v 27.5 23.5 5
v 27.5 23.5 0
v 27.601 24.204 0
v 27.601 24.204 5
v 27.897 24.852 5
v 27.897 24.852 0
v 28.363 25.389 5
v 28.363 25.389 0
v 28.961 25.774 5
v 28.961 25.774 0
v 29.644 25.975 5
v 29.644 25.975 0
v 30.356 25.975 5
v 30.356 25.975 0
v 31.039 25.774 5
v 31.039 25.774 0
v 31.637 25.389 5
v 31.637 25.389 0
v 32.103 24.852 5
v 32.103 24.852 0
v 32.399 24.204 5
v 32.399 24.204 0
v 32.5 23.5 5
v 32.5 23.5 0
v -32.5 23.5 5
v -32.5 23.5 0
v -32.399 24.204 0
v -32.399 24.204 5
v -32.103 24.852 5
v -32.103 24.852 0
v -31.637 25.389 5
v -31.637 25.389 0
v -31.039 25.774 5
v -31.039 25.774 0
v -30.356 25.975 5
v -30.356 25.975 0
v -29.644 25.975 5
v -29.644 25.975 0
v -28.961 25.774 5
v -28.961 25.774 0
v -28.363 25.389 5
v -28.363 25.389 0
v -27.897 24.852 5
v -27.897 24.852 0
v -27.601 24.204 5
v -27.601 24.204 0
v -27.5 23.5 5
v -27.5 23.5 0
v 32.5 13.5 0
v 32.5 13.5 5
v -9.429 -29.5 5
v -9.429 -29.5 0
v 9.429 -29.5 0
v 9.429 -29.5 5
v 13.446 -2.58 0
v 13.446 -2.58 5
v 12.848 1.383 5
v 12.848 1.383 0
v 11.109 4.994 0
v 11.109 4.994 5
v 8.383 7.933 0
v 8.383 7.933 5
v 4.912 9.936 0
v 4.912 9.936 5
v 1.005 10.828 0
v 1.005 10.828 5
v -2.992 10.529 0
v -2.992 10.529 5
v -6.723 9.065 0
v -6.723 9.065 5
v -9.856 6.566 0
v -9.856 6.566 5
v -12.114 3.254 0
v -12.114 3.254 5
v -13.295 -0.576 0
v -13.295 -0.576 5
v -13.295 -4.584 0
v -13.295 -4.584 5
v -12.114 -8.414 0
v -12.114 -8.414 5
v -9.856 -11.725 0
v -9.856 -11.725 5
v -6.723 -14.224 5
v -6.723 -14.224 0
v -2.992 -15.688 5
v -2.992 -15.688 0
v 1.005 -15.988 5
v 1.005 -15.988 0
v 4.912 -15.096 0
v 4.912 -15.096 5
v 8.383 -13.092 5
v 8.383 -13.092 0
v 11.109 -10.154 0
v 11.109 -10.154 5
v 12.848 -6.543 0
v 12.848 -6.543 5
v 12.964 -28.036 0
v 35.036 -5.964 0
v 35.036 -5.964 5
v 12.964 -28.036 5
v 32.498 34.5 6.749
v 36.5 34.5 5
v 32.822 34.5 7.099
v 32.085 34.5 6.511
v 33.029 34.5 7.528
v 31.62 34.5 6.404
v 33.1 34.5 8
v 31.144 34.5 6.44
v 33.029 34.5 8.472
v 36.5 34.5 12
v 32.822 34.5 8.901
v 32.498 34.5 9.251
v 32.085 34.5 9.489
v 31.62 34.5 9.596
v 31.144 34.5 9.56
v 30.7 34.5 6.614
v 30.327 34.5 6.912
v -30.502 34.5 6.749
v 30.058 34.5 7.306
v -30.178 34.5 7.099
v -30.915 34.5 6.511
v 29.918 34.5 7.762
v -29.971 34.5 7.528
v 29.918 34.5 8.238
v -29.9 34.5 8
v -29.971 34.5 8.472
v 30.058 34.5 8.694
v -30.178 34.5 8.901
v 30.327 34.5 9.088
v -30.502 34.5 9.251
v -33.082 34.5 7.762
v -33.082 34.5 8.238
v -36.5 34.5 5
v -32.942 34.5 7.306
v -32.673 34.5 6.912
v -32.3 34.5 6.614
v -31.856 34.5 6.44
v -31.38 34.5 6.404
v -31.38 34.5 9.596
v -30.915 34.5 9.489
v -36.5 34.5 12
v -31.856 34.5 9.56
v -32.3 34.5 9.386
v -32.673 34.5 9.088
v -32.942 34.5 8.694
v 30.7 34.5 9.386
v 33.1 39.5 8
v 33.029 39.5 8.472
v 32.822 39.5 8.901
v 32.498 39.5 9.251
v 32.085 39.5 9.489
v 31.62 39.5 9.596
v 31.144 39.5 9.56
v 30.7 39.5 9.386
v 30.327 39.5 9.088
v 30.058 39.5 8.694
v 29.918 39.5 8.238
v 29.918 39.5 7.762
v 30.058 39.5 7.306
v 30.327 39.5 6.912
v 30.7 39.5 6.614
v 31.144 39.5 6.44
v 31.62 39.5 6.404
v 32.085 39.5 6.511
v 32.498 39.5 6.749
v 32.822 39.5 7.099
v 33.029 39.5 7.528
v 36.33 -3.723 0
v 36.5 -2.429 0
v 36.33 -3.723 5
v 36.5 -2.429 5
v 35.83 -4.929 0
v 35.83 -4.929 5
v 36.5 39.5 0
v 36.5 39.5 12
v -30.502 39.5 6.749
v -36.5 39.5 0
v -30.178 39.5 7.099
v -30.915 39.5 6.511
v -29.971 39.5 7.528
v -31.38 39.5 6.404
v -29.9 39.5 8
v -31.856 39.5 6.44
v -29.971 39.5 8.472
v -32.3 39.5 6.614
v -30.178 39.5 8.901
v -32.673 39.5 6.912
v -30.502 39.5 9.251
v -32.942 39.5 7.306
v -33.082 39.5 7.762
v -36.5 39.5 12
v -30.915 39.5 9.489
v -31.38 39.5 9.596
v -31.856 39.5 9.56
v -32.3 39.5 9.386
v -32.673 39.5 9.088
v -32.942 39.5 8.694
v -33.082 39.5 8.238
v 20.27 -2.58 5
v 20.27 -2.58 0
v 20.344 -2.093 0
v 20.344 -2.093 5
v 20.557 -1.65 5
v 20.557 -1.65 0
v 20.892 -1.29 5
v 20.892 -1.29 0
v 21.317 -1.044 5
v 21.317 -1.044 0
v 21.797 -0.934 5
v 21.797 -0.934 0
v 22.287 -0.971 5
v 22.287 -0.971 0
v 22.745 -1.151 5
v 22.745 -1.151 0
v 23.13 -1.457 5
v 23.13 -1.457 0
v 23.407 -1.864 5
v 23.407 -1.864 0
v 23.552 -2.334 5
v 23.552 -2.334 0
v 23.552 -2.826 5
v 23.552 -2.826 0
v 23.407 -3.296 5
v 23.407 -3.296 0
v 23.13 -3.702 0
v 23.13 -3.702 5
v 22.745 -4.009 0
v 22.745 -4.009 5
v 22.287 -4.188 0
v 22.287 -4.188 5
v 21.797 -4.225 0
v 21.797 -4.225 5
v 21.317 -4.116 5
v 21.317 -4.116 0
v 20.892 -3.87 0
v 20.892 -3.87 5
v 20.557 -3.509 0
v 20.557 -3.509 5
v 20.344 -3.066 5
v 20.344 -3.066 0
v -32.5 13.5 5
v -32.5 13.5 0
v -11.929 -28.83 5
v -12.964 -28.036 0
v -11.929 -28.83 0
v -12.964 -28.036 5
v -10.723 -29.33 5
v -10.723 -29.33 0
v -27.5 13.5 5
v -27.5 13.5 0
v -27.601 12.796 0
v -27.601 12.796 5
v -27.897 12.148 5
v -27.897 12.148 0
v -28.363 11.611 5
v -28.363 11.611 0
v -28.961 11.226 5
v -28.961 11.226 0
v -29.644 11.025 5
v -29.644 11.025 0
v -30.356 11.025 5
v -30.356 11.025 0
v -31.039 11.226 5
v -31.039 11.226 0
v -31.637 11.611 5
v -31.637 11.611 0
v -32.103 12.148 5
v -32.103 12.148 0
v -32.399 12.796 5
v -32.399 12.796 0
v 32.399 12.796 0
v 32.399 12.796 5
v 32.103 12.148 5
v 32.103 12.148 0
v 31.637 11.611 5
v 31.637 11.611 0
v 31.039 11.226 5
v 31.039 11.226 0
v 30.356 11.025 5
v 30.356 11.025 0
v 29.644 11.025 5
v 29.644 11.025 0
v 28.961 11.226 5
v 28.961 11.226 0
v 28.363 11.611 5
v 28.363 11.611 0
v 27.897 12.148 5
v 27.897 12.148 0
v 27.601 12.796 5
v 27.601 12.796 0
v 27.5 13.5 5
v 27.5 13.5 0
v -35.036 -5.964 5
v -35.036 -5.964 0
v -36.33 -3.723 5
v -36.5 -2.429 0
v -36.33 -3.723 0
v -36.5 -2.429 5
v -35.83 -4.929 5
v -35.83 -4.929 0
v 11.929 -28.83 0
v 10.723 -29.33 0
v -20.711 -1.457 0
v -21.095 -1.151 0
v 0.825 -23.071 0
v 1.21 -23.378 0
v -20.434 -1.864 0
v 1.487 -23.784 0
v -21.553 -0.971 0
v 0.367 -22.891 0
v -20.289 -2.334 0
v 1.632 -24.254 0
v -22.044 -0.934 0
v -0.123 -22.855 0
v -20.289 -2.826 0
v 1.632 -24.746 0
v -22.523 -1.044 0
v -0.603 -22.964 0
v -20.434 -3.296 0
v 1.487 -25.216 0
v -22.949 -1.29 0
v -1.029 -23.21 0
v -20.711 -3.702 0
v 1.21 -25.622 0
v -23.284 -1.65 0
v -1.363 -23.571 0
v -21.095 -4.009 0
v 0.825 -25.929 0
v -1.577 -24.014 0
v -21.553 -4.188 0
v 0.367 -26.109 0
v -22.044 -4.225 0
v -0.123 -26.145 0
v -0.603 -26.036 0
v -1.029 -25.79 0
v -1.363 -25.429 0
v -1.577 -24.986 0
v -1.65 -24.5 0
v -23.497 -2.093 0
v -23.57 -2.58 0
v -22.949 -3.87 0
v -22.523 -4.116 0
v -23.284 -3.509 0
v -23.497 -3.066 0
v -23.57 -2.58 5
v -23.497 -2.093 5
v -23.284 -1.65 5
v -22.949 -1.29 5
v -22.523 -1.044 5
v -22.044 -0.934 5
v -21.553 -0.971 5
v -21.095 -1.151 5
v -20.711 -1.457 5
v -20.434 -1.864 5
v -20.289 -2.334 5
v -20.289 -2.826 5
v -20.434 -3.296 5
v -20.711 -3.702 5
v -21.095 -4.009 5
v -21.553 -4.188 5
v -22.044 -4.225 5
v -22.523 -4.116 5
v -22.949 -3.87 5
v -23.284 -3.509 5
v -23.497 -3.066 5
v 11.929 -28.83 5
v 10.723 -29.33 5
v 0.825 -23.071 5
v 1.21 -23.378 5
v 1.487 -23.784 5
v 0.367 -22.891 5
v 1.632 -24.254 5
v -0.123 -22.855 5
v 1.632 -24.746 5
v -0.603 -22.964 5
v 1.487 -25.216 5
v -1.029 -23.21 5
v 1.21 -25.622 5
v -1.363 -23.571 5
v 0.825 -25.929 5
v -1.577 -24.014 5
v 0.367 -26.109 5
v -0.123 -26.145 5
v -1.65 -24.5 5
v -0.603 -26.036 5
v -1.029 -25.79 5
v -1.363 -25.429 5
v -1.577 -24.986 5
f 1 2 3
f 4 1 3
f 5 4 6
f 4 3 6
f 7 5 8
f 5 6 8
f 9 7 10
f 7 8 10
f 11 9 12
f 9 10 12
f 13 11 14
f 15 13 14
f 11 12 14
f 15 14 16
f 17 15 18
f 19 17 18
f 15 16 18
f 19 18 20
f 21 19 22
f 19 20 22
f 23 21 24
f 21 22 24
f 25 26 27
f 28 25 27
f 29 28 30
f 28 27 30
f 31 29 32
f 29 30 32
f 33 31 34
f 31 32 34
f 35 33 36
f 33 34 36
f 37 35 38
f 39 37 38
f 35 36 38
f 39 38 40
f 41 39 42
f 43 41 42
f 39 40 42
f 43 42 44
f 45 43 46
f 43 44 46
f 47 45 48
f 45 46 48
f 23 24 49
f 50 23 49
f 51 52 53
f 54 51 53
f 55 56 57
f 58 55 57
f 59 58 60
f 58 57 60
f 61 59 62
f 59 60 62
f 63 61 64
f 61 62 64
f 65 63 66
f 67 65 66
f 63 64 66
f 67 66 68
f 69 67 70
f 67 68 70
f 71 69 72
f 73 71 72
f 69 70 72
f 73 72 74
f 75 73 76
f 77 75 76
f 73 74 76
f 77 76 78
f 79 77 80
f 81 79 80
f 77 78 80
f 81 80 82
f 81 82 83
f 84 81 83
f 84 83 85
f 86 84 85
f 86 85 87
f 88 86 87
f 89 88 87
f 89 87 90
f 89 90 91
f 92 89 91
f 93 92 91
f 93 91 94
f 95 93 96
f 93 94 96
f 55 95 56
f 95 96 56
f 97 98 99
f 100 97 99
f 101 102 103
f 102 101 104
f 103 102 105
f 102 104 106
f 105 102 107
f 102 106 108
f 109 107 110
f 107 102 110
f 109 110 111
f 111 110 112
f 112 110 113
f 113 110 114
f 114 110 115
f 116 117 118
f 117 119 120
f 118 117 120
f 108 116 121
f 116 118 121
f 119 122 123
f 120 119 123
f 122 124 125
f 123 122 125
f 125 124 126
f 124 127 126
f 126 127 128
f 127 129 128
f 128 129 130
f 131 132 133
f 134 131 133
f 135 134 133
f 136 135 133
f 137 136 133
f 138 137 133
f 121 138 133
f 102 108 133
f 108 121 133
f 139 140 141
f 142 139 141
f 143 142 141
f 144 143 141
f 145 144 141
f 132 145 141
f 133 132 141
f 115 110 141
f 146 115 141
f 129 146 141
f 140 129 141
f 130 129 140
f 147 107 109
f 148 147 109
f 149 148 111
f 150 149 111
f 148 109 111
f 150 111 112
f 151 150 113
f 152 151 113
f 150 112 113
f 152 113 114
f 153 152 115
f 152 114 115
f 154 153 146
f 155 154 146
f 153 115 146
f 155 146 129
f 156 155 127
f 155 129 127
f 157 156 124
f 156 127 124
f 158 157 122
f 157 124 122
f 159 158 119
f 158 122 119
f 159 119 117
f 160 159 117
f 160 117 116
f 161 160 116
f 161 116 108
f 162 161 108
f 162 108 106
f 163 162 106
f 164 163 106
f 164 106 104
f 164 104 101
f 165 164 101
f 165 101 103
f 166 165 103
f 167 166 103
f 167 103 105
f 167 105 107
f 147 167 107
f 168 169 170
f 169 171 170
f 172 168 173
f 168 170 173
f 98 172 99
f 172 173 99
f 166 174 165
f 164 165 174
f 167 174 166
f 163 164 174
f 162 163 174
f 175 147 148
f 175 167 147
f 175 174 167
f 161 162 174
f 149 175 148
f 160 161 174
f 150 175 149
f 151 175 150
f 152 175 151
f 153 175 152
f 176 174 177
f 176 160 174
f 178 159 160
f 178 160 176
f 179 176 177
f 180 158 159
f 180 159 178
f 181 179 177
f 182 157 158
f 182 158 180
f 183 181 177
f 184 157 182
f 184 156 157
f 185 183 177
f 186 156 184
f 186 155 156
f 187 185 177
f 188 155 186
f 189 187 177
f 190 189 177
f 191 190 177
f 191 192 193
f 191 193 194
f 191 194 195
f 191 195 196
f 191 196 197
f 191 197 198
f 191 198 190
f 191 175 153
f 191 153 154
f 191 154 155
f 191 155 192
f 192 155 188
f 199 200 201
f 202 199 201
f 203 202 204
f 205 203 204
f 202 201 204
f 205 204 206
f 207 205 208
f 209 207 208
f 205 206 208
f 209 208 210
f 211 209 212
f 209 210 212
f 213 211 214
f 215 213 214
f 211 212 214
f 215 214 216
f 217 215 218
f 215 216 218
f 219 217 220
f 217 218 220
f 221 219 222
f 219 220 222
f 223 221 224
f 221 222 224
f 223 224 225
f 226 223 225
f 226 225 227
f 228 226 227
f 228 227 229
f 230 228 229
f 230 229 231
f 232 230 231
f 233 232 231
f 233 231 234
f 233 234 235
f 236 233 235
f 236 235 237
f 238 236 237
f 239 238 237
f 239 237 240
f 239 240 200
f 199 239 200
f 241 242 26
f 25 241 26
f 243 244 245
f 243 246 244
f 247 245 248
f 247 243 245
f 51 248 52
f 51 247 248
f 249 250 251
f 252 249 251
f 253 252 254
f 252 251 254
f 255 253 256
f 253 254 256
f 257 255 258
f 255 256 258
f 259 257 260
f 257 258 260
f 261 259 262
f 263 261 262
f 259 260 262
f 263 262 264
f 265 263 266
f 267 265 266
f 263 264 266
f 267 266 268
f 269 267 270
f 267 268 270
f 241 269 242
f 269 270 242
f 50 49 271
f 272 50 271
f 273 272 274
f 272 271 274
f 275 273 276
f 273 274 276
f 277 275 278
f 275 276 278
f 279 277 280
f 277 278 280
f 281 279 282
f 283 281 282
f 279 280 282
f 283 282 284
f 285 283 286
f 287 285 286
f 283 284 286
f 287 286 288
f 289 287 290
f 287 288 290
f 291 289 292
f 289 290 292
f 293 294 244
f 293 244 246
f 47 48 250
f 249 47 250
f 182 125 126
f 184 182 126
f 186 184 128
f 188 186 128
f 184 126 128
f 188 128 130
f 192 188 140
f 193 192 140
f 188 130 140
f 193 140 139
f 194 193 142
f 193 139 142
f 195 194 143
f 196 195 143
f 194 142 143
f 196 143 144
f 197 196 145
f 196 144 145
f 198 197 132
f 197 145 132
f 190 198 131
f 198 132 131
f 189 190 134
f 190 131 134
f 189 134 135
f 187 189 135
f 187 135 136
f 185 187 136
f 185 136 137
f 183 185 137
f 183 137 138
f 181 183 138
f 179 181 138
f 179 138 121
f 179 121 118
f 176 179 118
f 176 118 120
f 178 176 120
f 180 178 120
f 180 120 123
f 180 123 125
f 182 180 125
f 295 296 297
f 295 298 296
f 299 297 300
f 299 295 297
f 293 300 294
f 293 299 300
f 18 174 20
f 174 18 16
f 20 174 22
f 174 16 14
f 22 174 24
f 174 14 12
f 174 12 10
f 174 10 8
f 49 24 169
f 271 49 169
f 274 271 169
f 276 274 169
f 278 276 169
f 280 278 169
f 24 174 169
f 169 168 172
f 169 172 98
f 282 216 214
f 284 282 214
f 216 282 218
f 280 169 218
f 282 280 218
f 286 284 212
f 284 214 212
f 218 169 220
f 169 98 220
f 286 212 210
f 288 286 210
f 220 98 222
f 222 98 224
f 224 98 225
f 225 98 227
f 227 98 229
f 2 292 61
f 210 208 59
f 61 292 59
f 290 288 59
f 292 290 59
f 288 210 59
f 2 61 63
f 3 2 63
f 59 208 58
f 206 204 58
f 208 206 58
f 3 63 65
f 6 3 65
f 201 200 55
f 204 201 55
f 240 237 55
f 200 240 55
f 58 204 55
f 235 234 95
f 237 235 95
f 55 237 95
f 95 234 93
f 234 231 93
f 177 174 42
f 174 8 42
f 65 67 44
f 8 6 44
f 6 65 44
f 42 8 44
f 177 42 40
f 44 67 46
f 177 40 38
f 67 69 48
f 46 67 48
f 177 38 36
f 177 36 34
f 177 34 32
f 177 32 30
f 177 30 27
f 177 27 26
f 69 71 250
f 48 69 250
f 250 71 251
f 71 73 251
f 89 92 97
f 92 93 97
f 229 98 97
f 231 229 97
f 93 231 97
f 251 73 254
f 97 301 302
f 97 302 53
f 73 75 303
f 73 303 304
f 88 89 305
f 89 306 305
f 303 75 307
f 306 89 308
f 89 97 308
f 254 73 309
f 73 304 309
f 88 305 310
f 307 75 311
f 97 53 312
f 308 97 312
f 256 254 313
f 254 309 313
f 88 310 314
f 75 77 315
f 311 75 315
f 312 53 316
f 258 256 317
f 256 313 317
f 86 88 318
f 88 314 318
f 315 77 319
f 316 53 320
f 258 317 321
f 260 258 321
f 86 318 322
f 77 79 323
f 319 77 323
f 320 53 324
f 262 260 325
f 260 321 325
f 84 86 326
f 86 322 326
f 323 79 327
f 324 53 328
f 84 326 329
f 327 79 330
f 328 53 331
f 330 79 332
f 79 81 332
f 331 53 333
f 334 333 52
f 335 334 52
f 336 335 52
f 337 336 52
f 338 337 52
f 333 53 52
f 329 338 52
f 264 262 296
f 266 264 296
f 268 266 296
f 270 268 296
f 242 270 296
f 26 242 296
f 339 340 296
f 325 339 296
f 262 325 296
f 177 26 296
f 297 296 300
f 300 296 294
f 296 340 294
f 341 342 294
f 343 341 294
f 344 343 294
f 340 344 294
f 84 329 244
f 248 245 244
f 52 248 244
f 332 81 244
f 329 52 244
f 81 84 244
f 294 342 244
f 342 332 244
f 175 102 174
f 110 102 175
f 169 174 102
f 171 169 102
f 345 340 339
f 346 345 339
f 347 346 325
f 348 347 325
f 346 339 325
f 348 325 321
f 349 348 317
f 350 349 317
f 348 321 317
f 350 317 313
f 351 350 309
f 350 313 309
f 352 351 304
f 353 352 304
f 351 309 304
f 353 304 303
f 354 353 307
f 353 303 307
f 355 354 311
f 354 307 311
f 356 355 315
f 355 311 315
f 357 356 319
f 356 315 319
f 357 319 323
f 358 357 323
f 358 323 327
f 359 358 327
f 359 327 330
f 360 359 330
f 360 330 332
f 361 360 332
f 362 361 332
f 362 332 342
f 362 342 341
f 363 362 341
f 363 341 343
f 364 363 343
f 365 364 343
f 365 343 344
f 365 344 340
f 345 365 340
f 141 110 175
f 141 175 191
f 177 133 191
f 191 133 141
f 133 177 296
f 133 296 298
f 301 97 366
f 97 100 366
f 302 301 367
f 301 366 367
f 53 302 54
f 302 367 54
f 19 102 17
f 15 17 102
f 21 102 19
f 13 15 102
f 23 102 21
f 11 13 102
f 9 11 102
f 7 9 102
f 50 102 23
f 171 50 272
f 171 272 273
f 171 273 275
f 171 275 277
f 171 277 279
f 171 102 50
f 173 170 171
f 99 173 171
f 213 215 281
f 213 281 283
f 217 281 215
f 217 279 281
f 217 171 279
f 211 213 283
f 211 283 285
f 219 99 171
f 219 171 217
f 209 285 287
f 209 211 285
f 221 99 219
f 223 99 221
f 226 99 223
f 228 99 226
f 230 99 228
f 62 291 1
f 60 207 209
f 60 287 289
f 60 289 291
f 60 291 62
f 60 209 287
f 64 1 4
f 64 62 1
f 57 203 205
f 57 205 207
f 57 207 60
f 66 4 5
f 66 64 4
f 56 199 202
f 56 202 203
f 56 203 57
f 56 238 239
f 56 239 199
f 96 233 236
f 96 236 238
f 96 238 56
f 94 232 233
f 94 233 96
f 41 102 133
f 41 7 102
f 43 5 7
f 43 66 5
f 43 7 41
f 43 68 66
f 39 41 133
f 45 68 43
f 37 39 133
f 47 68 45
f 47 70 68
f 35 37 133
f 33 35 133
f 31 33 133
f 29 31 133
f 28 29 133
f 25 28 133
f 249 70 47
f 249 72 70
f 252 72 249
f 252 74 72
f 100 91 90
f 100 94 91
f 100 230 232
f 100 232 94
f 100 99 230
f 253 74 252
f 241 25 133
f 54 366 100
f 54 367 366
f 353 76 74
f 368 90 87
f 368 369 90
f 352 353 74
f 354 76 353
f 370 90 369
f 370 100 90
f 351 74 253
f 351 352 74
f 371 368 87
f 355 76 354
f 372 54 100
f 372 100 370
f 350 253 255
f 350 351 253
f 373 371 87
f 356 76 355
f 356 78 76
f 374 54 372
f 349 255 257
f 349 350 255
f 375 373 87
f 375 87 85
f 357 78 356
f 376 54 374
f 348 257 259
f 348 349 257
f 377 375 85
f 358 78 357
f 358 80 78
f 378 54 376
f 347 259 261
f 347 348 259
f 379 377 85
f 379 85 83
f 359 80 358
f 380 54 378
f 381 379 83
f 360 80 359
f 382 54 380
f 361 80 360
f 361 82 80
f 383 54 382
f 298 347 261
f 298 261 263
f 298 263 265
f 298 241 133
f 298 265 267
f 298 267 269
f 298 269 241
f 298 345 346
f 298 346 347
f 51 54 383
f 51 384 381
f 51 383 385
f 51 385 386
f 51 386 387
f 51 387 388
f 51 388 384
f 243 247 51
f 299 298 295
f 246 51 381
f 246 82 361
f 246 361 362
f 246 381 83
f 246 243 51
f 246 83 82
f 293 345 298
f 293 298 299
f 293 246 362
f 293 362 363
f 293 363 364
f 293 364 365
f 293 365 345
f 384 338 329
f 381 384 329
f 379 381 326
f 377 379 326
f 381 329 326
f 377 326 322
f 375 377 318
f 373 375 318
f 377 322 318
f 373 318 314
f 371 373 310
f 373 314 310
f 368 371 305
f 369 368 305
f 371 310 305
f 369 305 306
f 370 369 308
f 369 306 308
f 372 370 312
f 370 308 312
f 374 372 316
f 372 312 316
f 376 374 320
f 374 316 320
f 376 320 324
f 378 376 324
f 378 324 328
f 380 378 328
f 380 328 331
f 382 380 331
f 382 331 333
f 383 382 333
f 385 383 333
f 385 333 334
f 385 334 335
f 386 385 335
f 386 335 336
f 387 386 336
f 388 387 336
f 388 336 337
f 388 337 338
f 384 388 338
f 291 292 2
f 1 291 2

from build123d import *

# Parameters (mm, degrees)
F0_W     = 73
F0_H     = 59
F1_DEPTH = 5
F2_SIZE  = 25
F4_D     = 3.3
F4_DEPTH = 13.8
F4_TIP   = 0.9914200214
F3_R     = 13.4455987062
F5_DEPTH = 5
F6_W     = 73
F6_H     = 5
F7_DEPTH = 5
F8_W     = 73
F8_H     = 12
F9_DEPTH = 5
F11_D    = 3.2
F12_R    = 5


with BuildPart() as f1:
    # F0 (on Top) → F1 (new body)
    with BuildSketch(Plane.XY):
        Rectangle(F0_W, F0_H)
        with BuildLine():
            Line((-32.5, 13.5), (-32.5, 23.5))
            ThreePointArc((-32.5, 23.5), (-30, 26), (-27.5, 23.5))
            Line((-27.5, 23.5), (-27.5, 13.5))
            ThreePointArc((-27.5, 13.5), (-30, 11), (-32.5, 13.5))
        make_face(mode=Mode.SUBTRACT)
        with BuildLine():
            Line((27.5, 13.5), (27.5, 23.5))
            ThreePointArc((27.5, 23.5), (30, 26), (32.5, 23.5))
            Line((32.5, 23.5), (32.5, 13.5))
            ThreePointArc((32.5, 13.5), (30, 11), (27.5, 13.5))
        make_face(mode=Mode.SUBTRACT)
    extrude(amount=F1_DEPTH)

    # F2
    f2_edges = [f1.edges().sort_by_distance(p)[0] for p in [
        (-36.5, -29.5, 2.5),
        (36.5, -29.5, 2.5),
    ]]
    chamfer(f2_edges, length=F2_SIZE)

    # F4
    with Locations(Plane.XY.offset(5)):
        with Locations((-21.9203102168, -2.5796897832), (0, -24.5), (21.9203102168, -2.5796897832)):
            Hole(F4_D / 2, depth=F4_DEPTH)
            with Locations((0, 0, -(F4_DEPTH + F4_TIP / 2))):  # 118° drill point
                Cone(0, F4_D / 2, F4_TIP, mode=Mode.SUBTRACT)

    # F3 (on face) → F5 (cut, through all)
    with BuildSketch(Plane.XY.offset(5)):
        with Locations((0, -2.5796897832)):
            Circle(F3_R)
    extrude(amount=-F5_DEPTH, mode=Mode.SUBTRACT)

    # F6 (on face) → F7 (join)
    with BuildSketch(Plane(origin=(0, 29.5, 0), x_dir=(-1, 0, 0), z_dir=(0, 1, 0))):
        with Locations((0, 2.5)):
            Rectangle(F6_W, F6_H)
    extrude(amount=F7_DEPTH)

    # F8 (on face) → F9 (join)
    with BuildSketch(Plane(origin=(0, 34.5, 0), x_dir=(-1, 0, 0), z_dir=(0, 1, 0))):
        with Locations((0, 6)):
            Rectangle(F8_W, F8_H)
    extrude(amount=F9_DEPTH)

    # F11 (through all)
    with Locations(Plane(origin=(0, 39.5, 0), x_dir=(-1, 0, 0), z_dir=(0, 1, 0))):
        with Locations((-31.5, 8), (31.5, 8)):
            Hole(F11_D / 2)

    # F12
    f12_edges = [f1.edges().sort_by_distance(p)[0] for p in [
        (36.5, -4.5, 2.5),
        (11.5, -29.5, 2.5),
        (-11.5, -29.5, 2.5),
        (-36.5, -4.5, 2.5),
    ]]
    fillet(f12_edges, radius=F12_R)


solid = f1.part
